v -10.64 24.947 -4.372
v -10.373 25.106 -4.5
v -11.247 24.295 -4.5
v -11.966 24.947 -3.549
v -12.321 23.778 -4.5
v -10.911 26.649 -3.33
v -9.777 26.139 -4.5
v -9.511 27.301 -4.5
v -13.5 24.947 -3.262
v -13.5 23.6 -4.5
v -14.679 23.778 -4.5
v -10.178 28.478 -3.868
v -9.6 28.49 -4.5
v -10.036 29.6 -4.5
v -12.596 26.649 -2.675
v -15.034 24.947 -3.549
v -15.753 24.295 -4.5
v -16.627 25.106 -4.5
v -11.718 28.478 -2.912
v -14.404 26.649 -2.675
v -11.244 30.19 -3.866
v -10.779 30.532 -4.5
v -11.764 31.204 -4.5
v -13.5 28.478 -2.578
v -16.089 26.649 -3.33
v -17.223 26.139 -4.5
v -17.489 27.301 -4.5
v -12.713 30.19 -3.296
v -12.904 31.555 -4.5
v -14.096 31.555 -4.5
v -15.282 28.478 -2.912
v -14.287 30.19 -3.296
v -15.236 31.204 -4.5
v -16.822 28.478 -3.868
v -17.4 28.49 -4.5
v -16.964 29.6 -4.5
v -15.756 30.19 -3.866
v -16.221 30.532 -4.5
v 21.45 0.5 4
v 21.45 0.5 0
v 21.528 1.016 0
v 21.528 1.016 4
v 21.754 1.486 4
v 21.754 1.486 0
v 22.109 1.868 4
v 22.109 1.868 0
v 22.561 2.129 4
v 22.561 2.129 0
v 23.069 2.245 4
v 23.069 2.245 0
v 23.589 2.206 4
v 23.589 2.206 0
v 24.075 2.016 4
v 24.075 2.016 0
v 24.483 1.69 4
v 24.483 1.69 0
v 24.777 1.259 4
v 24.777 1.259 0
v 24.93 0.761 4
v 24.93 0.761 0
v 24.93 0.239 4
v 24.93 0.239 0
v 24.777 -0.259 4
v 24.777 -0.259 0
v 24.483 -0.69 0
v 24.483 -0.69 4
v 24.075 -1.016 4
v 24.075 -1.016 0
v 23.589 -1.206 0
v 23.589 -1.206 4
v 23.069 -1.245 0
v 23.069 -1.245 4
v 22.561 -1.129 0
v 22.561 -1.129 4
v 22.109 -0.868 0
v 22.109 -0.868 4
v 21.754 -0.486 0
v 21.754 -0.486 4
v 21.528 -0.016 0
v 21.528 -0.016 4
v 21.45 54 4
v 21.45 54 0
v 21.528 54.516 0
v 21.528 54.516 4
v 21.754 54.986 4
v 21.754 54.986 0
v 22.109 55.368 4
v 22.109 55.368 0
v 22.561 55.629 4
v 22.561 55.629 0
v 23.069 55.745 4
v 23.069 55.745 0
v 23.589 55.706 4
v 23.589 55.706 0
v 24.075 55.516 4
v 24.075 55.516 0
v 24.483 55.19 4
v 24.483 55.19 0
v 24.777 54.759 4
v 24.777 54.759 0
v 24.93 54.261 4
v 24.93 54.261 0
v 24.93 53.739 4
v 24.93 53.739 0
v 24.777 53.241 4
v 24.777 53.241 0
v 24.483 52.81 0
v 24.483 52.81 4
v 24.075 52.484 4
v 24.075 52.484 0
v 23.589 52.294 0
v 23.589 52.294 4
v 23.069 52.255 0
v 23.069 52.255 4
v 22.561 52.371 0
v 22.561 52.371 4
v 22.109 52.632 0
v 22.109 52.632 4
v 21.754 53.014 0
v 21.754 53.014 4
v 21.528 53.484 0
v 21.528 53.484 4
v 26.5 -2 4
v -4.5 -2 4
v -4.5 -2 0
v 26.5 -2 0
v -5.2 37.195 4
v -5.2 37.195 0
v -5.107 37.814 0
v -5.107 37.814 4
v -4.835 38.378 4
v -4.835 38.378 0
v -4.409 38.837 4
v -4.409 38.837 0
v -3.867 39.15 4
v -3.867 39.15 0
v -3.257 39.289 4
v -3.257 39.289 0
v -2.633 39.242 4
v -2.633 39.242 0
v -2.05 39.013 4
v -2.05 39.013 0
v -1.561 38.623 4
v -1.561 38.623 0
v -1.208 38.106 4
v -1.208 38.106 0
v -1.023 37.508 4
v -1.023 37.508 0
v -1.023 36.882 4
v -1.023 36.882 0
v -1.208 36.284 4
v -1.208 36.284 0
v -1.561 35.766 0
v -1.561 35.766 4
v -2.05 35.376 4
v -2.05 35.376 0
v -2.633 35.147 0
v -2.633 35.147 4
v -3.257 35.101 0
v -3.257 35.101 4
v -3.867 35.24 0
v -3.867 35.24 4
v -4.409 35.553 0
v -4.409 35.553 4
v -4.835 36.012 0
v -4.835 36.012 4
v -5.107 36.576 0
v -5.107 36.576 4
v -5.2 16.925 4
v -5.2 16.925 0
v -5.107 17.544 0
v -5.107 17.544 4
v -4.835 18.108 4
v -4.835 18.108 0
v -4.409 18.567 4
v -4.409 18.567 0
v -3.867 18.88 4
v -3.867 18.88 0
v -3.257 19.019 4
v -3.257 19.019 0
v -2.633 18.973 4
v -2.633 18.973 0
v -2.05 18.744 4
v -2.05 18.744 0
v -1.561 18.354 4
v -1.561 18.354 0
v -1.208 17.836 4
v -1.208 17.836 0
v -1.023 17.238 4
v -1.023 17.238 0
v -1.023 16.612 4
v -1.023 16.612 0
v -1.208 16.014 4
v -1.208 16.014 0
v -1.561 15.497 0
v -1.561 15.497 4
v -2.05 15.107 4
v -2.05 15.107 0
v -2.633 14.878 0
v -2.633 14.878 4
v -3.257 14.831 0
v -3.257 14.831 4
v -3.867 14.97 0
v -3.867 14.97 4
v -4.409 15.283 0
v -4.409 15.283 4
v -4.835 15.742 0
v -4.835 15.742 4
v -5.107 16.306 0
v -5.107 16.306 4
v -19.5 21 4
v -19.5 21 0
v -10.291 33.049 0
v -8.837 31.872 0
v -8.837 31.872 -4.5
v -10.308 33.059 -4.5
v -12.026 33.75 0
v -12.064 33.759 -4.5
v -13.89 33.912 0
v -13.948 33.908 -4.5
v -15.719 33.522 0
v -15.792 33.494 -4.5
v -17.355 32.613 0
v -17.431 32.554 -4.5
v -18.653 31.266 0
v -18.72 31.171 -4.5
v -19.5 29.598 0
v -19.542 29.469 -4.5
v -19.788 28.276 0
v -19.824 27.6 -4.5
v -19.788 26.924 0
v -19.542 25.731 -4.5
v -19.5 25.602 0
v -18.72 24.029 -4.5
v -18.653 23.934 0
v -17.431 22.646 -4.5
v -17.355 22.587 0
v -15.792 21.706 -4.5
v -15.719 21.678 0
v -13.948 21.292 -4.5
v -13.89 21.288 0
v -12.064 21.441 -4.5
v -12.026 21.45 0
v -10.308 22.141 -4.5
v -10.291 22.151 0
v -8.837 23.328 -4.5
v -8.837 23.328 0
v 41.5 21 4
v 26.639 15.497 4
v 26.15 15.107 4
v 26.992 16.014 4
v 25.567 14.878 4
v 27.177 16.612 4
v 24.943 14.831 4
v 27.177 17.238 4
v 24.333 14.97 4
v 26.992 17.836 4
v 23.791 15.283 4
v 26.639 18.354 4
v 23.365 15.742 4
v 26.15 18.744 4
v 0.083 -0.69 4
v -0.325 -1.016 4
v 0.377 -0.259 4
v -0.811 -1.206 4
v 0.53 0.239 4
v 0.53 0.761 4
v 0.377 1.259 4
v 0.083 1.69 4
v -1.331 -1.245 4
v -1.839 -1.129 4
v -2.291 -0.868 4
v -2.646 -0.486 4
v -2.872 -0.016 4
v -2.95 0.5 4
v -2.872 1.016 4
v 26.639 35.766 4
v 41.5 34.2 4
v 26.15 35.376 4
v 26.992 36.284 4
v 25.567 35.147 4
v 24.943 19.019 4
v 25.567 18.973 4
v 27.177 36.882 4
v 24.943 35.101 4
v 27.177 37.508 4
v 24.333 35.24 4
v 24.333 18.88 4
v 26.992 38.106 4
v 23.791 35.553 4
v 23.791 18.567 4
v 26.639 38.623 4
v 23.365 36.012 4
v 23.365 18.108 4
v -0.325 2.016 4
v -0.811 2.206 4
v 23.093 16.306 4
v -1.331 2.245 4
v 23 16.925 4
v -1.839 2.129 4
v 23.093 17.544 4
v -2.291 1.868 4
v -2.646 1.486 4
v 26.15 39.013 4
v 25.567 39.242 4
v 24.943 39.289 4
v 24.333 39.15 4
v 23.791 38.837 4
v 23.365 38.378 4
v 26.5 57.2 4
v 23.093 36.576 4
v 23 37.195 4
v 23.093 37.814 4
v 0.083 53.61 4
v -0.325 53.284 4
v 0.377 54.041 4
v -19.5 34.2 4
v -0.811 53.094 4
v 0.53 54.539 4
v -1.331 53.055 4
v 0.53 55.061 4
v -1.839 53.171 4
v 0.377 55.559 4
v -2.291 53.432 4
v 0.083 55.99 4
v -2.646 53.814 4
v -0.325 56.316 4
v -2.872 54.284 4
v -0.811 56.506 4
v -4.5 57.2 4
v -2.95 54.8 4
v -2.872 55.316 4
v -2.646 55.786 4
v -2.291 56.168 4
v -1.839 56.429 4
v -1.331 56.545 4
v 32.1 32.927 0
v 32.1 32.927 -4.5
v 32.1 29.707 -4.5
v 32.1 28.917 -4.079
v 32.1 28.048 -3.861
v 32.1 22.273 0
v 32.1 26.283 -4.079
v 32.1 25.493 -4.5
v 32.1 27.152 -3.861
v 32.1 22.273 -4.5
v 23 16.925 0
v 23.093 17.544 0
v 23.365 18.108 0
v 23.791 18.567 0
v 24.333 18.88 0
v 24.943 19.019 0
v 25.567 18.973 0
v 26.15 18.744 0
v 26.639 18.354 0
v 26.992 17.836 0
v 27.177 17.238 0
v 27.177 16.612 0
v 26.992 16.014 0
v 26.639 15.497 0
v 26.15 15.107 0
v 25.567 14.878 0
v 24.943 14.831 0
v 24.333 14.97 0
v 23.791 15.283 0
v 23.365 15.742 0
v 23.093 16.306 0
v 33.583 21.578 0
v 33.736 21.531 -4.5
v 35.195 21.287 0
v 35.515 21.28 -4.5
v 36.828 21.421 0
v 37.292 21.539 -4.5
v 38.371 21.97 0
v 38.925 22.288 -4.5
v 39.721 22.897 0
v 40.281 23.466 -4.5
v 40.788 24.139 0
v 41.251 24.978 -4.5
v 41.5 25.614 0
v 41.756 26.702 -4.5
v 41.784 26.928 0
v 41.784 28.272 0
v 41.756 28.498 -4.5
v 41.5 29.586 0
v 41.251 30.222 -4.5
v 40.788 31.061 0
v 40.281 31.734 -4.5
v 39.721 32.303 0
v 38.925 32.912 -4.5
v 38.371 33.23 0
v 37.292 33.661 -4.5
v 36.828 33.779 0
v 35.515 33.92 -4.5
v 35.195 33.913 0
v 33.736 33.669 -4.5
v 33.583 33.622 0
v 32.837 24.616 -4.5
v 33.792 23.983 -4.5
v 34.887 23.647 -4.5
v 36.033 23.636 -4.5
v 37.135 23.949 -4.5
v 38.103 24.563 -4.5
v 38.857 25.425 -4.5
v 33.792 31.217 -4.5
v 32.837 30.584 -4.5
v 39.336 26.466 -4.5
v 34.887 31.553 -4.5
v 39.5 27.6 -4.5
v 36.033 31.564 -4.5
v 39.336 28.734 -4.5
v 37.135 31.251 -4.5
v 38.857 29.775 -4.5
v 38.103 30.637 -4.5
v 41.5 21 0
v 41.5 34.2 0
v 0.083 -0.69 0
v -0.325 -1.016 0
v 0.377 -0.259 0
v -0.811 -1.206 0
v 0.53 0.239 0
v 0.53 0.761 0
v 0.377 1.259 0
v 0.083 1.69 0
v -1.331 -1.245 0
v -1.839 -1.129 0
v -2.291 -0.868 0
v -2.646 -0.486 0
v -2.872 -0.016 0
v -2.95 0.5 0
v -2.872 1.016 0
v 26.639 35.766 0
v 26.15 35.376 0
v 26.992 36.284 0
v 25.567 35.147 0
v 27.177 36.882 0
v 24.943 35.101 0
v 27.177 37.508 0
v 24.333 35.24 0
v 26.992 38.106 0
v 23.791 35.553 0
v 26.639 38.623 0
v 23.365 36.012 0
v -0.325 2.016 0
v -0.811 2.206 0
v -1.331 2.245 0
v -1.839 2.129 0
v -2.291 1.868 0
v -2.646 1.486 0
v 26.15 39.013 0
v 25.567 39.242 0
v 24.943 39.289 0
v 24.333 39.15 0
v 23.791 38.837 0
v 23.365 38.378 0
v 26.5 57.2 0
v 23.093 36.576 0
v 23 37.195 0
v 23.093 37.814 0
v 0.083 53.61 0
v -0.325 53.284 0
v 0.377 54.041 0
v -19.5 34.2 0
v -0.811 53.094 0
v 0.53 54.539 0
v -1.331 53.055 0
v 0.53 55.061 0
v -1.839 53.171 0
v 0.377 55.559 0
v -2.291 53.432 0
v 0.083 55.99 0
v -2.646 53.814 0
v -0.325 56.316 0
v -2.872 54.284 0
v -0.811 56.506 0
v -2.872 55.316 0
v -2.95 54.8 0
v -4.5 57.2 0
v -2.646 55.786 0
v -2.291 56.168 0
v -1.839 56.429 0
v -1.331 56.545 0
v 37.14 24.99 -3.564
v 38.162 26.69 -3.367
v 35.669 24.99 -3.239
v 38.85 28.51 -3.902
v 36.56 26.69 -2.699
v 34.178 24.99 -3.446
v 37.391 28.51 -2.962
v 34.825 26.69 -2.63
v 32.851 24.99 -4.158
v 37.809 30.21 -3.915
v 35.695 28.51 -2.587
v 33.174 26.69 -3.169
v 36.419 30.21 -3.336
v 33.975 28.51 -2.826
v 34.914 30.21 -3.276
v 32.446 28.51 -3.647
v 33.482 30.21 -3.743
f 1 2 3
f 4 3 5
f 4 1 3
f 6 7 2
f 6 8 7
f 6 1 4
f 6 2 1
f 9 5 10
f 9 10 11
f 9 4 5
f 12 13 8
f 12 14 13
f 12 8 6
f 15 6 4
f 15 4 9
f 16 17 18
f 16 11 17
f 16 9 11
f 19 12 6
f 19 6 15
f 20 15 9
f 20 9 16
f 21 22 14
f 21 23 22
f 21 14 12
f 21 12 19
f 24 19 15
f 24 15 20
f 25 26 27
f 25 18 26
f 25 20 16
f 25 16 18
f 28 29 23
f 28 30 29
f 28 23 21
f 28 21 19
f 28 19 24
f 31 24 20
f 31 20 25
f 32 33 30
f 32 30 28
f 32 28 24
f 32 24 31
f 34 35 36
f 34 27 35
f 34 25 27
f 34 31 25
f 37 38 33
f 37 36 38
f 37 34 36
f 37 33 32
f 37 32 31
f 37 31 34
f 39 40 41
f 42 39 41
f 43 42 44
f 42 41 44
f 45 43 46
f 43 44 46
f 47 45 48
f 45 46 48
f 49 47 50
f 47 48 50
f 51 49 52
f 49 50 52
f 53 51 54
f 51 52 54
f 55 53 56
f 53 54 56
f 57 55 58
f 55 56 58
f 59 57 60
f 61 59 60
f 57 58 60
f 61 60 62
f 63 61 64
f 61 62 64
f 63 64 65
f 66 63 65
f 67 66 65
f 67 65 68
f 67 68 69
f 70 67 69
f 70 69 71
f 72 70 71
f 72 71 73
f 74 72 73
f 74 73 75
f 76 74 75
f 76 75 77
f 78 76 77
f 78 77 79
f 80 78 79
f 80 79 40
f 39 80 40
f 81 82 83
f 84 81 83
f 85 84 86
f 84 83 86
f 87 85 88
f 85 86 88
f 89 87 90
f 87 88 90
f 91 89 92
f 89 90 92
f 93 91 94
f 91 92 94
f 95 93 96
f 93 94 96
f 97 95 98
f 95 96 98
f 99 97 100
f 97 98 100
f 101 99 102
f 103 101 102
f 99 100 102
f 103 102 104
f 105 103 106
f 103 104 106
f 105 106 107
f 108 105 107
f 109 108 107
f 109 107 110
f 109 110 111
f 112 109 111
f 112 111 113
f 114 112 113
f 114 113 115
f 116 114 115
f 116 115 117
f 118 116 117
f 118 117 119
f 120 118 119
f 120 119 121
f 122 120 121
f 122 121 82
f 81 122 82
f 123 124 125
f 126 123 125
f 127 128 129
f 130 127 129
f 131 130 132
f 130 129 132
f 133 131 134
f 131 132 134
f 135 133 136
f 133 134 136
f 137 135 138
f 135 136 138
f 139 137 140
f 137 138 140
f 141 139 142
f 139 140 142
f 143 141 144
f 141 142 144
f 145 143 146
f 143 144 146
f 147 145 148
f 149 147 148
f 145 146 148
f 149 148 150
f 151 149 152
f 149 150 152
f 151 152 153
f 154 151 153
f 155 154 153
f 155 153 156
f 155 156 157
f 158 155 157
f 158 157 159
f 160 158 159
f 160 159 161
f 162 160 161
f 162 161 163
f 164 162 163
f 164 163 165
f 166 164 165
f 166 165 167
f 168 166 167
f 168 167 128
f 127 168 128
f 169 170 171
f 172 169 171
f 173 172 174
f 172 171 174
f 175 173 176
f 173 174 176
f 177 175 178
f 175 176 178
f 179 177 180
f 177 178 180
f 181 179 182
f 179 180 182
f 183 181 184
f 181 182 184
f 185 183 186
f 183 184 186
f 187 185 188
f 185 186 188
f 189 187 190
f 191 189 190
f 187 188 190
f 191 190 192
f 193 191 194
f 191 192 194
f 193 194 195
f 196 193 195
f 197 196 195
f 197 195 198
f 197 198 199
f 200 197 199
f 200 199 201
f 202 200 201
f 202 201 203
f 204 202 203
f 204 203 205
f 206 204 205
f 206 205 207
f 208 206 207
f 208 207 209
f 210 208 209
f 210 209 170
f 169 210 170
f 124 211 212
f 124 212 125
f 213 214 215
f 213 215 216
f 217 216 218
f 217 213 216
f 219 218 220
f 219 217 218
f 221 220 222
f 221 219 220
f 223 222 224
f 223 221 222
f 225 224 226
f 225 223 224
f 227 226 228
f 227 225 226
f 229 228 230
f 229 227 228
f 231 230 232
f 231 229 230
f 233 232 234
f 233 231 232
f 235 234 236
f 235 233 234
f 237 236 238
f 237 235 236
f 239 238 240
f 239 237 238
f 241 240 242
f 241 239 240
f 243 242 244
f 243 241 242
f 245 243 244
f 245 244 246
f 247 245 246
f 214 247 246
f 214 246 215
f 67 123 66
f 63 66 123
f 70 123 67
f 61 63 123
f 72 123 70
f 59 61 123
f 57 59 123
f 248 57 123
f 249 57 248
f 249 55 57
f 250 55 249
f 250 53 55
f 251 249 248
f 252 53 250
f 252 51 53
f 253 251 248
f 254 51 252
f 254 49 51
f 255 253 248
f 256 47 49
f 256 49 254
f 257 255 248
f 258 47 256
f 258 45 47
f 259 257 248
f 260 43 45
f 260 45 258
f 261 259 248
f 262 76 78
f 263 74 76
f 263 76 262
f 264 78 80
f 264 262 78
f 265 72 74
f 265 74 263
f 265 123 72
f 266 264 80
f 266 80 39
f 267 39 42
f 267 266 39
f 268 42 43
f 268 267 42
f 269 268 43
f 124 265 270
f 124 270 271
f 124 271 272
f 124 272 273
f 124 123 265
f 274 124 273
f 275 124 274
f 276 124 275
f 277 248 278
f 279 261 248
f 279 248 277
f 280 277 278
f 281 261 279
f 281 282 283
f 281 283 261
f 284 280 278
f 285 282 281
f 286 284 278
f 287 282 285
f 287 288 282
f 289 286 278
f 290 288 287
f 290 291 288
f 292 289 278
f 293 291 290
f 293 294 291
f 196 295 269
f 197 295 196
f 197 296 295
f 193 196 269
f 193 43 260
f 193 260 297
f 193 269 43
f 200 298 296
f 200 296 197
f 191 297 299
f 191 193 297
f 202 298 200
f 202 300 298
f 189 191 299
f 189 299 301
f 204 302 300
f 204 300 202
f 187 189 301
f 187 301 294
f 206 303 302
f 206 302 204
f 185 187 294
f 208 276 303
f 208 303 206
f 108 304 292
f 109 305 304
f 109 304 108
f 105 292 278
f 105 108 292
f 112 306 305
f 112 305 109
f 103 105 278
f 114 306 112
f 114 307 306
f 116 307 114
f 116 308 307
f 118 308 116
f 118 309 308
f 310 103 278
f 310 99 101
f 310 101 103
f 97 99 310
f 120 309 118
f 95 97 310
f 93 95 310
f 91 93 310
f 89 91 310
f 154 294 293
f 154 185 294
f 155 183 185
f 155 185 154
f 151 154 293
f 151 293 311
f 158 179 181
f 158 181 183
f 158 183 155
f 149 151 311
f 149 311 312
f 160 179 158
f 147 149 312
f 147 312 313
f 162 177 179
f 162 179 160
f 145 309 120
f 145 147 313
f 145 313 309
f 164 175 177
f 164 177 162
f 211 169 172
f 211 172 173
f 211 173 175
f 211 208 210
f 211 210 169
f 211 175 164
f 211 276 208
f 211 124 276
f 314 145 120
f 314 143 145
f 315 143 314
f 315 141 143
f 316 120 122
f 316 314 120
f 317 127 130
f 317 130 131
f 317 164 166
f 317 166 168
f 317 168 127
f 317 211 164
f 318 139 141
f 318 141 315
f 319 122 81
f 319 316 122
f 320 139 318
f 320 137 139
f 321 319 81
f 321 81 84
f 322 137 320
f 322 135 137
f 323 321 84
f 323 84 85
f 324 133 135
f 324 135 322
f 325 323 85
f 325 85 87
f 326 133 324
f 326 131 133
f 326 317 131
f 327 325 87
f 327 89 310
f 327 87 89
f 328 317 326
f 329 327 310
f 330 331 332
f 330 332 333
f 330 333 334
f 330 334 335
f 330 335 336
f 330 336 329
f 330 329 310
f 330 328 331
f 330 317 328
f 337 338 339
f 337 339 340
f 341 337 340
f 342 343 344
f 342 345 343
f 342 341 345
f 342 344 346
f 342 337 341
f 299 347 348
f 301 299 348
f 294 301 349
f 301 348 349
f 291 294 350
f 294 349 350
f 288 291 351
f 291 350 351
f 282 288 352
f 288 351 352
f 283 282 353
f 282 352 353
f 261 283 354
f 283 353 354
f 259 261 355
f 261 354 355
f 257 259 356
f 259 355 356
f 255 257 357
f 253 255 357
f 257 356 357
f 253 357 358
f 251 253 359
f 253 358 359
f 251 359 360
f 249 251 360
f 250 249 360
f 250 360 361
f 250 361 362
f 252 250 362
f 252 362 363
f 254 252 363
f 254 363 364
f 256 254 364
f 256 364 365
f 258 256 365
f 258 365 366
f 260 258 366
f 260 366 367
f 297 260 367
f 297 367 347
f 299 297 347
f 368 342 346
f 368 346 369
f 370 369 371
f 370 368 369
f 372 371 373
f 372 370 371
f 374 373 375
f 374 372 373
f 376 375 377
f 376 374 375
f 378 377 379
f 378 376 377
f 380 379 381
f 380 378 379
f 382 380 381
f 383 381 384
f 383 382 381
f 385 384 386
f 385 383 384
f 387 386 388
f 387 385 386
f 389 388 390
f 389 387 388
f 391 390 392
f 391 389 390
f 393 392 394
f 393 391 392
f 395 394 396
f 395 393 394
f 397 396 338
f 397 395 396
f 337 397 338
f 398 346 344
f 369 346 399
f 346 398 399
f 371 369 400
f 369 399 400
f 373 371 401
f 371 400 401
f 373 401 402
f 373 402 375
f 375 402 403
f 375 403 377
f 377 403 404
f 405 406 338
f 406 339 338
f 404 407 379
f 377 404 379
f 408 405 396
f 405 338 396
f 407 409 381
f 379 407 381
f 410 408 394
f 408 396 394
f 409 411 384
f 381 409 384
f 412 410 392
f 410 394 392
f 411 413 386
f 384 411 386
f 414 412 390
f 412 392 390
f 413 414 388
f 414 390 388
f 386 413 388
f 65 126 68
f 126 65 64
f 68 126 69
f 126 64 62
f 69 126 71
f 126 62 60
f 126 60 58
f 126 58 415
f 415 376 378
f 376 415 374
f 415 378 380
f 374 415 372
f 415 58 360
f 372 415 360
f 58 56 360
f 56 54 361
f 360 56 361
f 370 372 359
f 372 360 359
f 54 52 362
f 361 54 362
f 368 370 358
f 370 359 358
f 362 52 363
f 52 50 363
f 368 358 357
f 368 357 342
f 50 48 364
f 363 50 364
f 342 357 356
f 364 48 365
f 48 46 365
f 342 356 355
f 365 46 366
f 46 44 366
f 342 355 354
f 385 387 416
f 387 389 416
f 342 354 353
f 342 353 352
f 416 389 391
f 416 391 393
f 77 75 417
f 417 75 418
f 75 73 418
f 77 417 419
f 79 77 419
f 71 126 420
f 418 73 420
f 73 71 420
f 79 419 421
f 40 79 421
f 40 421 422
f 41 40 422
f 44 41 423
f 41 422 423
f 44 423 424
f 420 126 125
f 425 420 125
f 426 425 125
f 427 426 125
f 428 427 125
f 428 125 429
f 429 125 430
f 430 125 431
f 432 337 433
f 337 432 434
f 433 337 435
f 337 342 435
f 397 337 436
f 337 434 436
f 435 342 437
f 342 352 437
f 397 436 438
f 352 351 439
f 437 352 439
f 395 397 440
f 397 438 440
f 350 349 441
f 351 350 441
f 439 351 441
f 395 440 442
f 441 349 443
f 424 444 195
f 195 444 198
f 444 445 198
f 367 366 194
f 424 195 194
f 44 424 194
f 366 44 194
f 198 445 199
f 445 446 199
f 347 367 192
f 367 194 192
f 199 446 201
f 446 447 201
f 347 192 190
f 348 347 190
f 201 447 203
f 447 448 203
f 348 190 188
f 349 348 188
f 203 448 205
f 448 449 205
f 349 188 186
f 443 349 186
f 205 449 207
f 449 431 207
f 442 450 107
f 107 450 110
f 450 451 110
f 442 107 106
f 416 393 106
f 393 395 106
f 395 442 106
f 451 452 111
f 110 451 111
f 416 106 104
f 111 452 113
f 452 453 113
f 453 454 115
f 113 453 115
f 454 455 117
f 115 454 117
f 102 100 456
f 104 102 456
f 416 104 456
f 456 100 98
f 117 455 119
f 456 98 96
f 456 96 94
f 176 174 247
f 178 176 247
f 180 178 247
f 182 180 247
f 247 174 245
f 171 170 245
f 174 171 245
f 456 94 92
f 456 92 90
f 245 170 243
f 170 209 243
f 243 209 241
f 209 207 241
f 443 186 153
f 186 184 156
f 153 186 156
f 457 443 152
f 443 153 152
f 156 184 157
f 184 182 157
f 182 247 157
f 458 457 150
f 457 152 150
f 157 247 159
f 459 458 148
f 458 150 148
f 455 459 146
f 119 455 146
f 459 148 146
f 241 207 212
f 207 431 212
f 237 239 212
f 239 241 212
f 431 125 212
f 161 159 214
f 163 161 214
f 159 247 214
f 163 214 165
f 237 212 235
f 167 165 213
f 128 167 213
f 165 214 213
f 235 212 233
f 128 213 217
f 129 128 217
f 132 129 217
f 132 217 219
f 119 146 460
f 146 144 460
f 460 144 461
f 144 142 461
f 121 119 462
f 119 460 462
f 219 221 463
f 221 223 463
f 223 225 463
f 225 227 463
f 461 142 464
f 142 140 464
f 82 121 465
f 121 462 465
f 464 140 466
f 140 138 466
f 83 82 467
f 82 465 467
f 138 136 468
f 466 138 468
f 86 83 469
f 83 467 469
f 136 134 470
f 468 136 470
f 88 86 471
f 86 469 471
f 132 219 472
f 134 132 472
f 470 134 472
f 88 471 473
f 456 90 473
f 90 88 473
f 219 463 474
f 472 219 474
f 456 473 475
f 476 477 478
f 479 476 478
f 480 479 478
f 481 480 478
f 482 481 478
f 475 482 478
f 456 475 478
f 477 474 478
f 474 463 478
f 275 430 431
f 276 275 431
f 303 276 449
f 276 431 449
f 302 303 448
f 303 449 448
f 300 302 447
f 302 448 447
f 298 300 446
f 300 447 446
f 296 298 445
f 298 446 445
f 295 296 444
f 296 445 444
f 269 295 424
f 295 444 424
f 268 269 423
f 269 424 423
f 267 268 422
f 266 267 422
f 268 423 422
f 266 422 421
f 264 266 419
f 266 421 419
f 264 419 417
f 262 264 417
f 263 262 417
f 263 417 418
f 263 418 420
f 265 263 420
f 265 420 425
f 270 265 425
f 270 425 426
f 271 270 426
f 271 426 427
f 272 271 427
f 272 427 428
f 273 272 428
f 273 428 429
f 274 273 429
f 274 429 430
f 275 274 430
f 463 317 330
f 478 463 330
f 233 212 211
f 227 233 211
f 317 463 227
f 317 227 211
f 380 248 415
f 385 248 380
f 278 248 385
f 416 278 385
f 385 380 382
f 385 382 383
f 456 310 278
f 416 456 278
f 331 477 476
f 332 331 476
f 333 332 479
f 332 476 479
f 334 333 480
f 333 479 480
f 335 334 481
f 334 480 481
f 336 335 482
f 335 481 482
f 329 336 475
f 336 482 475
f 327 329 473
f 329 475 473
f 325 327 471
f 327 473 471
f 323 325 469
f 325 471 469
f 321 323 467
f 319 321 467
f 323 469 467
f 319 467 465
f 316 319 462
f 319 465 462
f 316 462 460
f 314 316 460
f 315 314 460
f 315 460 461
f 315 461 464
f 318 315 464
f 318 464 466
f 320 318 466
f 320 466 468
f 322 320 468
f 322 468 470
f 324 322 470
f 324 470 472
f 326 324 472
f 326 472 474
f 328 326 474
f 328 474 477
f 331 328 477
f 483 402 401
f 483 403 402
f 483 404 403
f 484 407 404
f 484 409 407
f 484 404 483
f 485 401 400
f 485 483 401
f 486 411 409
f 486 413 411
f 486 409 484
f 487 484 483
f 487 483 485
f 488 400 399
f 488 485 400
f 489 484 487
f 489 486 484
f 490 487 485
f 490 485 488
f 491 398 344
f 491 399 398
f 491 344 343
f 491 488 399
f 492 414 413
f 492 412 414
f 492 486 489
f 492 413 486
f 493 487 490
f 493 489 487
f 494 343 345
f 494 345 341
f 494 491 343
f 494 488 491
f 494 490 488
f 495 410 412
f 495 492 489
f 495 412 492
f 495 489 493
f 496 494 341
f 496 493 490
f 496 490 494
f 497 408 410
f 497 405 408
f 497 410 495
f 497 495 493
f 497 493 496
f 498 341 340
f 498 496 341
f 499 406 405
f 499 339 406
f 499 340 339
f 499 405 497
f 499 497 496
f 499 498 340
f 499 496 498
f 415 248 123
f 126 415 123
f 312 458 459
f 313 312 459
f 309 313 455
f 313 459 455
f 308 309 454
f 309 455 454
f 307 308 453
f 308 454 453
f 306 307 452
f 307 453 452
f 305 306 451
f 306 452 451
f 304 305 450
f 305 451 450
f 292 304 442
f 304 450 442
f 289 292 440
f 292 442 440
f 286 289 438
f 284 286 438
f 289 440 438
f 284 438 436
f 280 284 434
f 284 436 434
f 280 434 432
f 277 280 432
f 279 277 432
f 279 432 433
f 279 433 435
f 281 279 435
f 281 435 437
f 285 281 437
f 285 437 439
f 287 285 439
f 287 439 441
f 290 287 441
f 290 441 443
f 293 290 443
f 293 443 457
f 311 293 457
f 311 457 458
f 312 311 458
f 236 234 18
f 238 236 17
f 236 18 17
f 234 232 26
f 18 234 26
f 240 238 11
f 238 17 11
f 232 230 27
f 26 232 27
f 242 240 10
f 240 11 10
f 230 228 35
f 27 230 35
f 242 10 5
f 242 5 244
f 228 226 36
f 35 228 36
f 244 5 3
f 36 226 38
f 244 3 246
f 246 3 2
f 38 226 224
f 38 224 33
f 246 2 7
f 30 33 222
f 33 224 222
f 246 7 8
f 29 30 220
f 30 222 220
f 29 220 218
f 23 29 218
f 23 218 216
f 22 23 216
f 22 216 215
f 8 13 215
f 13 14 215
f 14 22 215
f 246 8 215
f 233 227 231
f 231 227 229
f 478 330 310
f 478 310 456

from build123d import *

# Parameters (mm, degrees)
CROQUIS1_W               = 22
CROQUIS1_H               = 55.2
SALIENTE_EXTRUIR1_DEPTH  = 4
CROQUIS2_W               = 12.1
CROQUIS2_H               = 4
CORTAR_EXTRUIR1_DEPTH    = 9.6
CROQUIS3_W               = 12.1
CROQUIS3_H               = 4
CORTAR_EXTRUIR2_DEPTH    = 9.6
CORTAR_EXTRUIR3_DEPTH    = 16
CORTAR_EXTRUIR4_START    = -16
CORTAR_EXTRUIR4_DEPTH    = 16
CROQUIS9_W               = 11.778481694
CROQUIS9_H               = 4
CORTAR_EXTRUIR5_DEPTH    = 2
CROQUIS11_W              = 4.95
CROQUIS11_H              = 4
SALIENTE_EXTRUIR3_DEPTH  = 2
CROQUIS12_W              = 4
CROQUIS12_H              = 1.8
SALIENTE_EXTRUIR4_DEPTH  = 12.1
CROQUIS13_W              = 4.95
CROQUIS13_H              = 4
SALIENTE_EXTRUIR5_DEPTH  = 2
CROQUIS14_W              = 4
CROQUIS14_H              = 1.8
SALIENTE_EXTRUIR6_DEPTH  = 12.1
CROQUIS17_W              = 4
CROQUIS17_H              = 59.2
SALIENTE_EXTRUIR8_DEPTH  = 11.5
CROQUIS18_W              = 4
CROQUIS18_H              = 59.2
SALIENTE_EXTRUIR9_DEPTH  = 11.5
CROQUIS19_R              = 1.75
CORTAR_EXTRUIR6_DEPTH    = 11.5
CROQUIS27_W              = 12.1
CROQUIS27_H              = 55.6
CORTAR_EXTRUIR8_DEPTH    = 10
CROQUIS28_W              = 12.1
CROQUIS28_H              = 4
SALIENTE_EXTRUIR10_DEPTH = 55.6
CROQUIS33_W              = 4
CROQUIS33_H              = 59.2
SALIENTE_EXTRUIR13_DEPTH = 8
CROQUIS30_R              = 2.1
CORTAR_EXTRUIR9_DEPTH    = 10
CROQUIS32_W              = 4
CROQUIS32_H              = 59.2
SALIENTE_EXTRUIR12_DEPTH = 8
SALIENTE_EXTRUIR11_DEPTH = 4.5
CORTAR_EXTRUIR10_DEPTH   = 8


with BuildPart() as part:
    # Croquis1 → Saliente-Extruir1 (new body)
    with BuildSketch(Plane.XY):
        with Locations((11, 27.6)):
            Rectangle(CROQUIS1_W, CROQUIS1_H)
    extrude(amount=SALIENTE_EXTRUIR1_DEPTH)

    # Croquis2 → Cortar-Extruir1 (cut)
    with BuildSketch(Plane(origin=(0, 55.2, 0), x_dir=(1, 0, 0), z_dir=(0, 1, 0))):
        with Locations((11, -2)):
            Rectangle(CROQUIS2_W, CROQUIS2_H)
    extrude(amount=-CORTAR_EXTRUIR1_DEPTH, mode=Mode.SUBTRACT)

    # Croquis3 → Cortar-Extruir2 (cut)
    with BuildSketch(Plane.XZ):
        with Locations((11, 2)):
            Rectangle(CROQUIS3_W, CROQUIS3_H)
    extrude(amount=-CORTAR_EXTRUIR2_DEPTH, mode=Mode.SUBTRACT)

    # Croquis5 → Cortar-Extruir3 (cut)
    with BuildSketch(Plane.XZ.offset(-9.6)):
        with BuildLine():
            Line((7.4, 4), (14.6, 4))
            ThreePointArc((14.6, 4), (16.401151853, 1.506649462), (17.05, -1.5))
            Line((17.05, -1.5), (4.95, -1.5))
            ThreePointArc((4.95, -1.5), (5.598848147, 1.506649462), (7.4, 4))
        make_face()
    extrude(amount=-CORTAR_EXTRUIR3_DEPTH, mode=Mode.SUBTRACT)

    # Croquis7 → Cortar-Extruir4 (cut)
    with BuildSketch(Plane(origin=(0, 45.6, 0), x_dir=(1, 0, 0), z_dir=(0, 1, 0)).offset(CORTAR_EXTRUIR4_START)):
        with BuildLine():
            Line((4.95, 1.5), (17.05, 1.5))
            ThreePointArc((17.05, 1.5), (16.401151853, -1.506649462), (14.6, -4))
            Line((14.6, -4), (7.4, -4))
            ThreePointArc((7.4, -4), (5.598848147, -1.506649462), (4.95, 1.5))
        make_face()
    extrude(amount=CORTAR_EXTRUIR4_DEPTH, mode=Mode.SUBTRACT)

    # Croquis9 → Cortar-Extruir5 (cut)
    with BuildSketch(Plane(origin=(0, 0, 0), x_dir=(-1, 0, 0), z_dir=(0, 0, -1))):
        with Locations((-11, 27.6)):
            Rectangle(CROQUIS9_W, CROQUIS9_H)
    extrude(amount=-CORTAR_EXTRUIR5_DEPTH, mode=Mode.SUBTRACT)

    # Croquis11 → Saliente-Extruir3 (add)
    with BuildSketch(Plane(origin=(0, 55.2, 0), x_dir=(1, 0, 0), z_dir=(0, 1, 0))):
        with Locations((2.475, -2)):
            Rectangle(CROQUIS11_W, CROQUIS11_H)
        with Locations((19.525, -2)):
            Rectangle(CROQUIS11_W, CROQUIS11_H)
    extrude(amount=SALIENTE_EXTRUIR3_DEPTH)

    # Croquis12 → Saliente-Extruir4 (add)
    with BuildSketch(Plane(origin=(4.95, 0, 0), x_dir=(0, 0, -1), z_dir=(1, 0, 0))):
        with Locations((-2, 56.3)):
            Rectangle(CROQUIS12_W, CROQUIS12_H)
    extrude(amount=SALIENTE_EXTRUIR4_DEPTH)

    # Croquis13 → Saliente-Extruir5 (add)
    with BuildSketch(Plane.XZ):
        with Locations((19.525, 2)):
            Rectangle(CROQUIS13_W, CROQUIS13_H)
        with Locations((2.475, 2)):
            Rectangle(CROQUIS13_W, CROQUIS13_H)
    extrude(amount=SALIENTE_EXTRUIR5_DEPTH)

    # Croquis14 → Saliente-Extruir6 (add)
    with BuildSketch(Plane(origin=(4.95, 0, 0), x_dir=(0, 0, -1), z_dir=(1, 0, 0))):
        with Locations((-2, -1.1)):
            Rectangle(CROQUIS14_W, CROQUIS14_H)
    extrude(amount=SALIENTE_EXTRUIR6_DEPTH)

    # Croquis17 → Saliente-Extruir8 (add)
    with BuildSketch(Plane.ZY):
        with Locations((2, 27.6)):
            Rectangle(CROQUIS17_W, CROQUIS17_H)
    extrude(amount=SALIENTE_EXTRUIR8_DEPTH)

    # Croquis18 → Saliente-Extruir9 (add)
    with BuildSketch(Plane(origin=(22, 0, 0), x_dir=(0, 0, -1), z_dir=(1, 0, 0))):
        with Locations((-2, 27.6)):
            Rectangle(CROQUIS18_W, CROQUIS18_H)
    extrude(amount=SALIENTE_EXTRUIR9_DEPTH)

    # Croquis19 → Cortar-Extruir6 (cut)
    with BuildSketch(Plane(origin=(0, 0, 0), x_dir=(-1, 0, 0), z_dir=(0, 0, -1))):
        with Locations((-23.2, 54)):
            Circle(CROQUIS19_R)
        with Locations((1.2, 54.8)):
            Circle(CROQUIS19_R)
        with Locations((1.2, 0.5)):
            Circle(CROQUIS19_R)
        with Locations((-23.2, 0.5)):
            Circle(CROQUIS19_R)
    extrude(amount=-CORTAR_EXTRUIR6_DEPTH, mode=Mode.SUBTRACT)

    # Croquis27 → Cortar-Extruir8 (cut)
    with BuildSketch(Plane(origin=(0, 0, 0), x_dir=(-1, 0, 0), z_dir=(0, 0, -1))):
        with Locations((-11, 27.6)):
            Rectangle(CROQUIS27_W, CROQUIS27_H)
    extrude(amount=-CORTAR_EXTRUIR8_DEPTH, mode=Mode.SUBTRACT)

    # Croquis28 → Saliente-Extruir10 (add)
    with BuildSketch(Plane.XZ.offset(-55.4)):
        with Locations((11, 2)):
            Rectangle(CROQUIS28_W, CROQUIS28_H)
    extrude(amount=SALIENTE_EXTRUIR10_DEPTH)

    # Croquis33 → Saliente-Extruir13 (add)
    with BuildSketch(Plane.ZY.offset(11.5)):
        with Locations((2, 27.6)):
            Rectangle(CROQUIS33_W, CROQUIS33_H)
    extrude(amount=SALIENTE_EXTRUIR13_DEPTH)

    # Croquis30 → Cortar-Extruir9 (cut)
    with BuildSketch(Plane(origin=(0, 0, 0), x_dir=(-1, 0, 0), z_dir=(0, 0, -1))):
        with Locations((-25.1, 37.194789274)):
            Circle(CROQUIS30_R)
        with Locations((-25.1, 16.925277734)):
            Circle(CROQUIS30_R)
        with Locations((3.1, 37.194789274)):
            Circle(CROQUIS30_R)
        with Locations((3.1, 16.925277734)):
            Circle(CROQUIS30_R)
    extrude(amount=-CORTAR_EXTRUIR9_DEPTH, mode=Mode.SUBTRACT)

    # Croquis32 → Saliente-Extruir12 (add)
    with BuildSketch(Plane(origin=(33.5, 0, 0), x_dir=(0, 0, -1), z_dir=(1, 0, 0))):
        with Locations((-2, 27.6)):
            Rectangle(CROQUIS32_W, CROQUIS32_H)
    extrude(amount=SALIENTE_EXTRUIR12_DEPTH)

    # Croquis29 → Saliente-Extruir11 (add)
    with BuildSketch(Plane(origin=(0, 0, 0), x_dir=(-1, 0, 0), z_dir=(0, 0, -1))):
        with BuildLine():
            Line((-32.099895832, 32.201901781), (-32.099895832, 22.998098219))
            Line((-32.099895832, 22.998098219), (-32.099895832, 22.27255299))
            ThreePointArc((-32.099895832, 22.27255299), (-41.82, 27.6), (-32.099895832, 32.92744701))
            Line((-32.099895832, 32.92744701), (-32.099895832, 32.201901781))
        make_face()
        with BuildLine():
            Line((8.83711623, 23.32791238), (8.83711623, 31.87208762))
            ThreePointArc((8.83711623, 31.87208762), (19.824019109, 27.6), (8.83711623, 23.32791238))
        make_face()
    extrude(amount=SALIENTE_EXTRUIR11_DEPTH)

    # Croquis35 → Cortar-Revolución1 (revolve, cut)
    with BuildSketch(Plane(origin=(0, 0, -7.5), x_dir=(-1, 0, 0), z_dir=(0, 0, -1))):
        with BuildLine():
            Line((-35.5, 32.6), (-35.5, 22.6))
            ThreePointArc((-35.5, 22.6), (-40.5, 27.6), (-35.5, 32.6))
        make_face()
    revolve(axis=Axis((35.5, 32.6, -7.5), (0, -1, 0)), mode=Mode.SUBTRACT)

    # Croquis36 → Cortar-Revolución2 (revolve, cut)
    with BuildSketch(Plane(origin=(0, 0, -7.5), x_dir=(-1, 0, 0), z_dir=(0, 0, -1))):
        with BuildLine():
            Line((13.5, 32.6), (13.5, 22.6))
            ThreePointArc((13.5, 22.6), (18.5, 27.6), (13.5, 32.6))
        make_face()
    revolve(axis=Axis((-13.5, 32.6, -7.5), (0, -1, 0)), mode=Mode.SUBTRACT)

    # Croquis37 → Cortar-Extruir10 (cut)
    with BuildSketch(Plane.XY.offset(4)):
        Polygon((-19.5, 57.2), (-19.5, 34.2), (-4.5, 57.2), align=None)
        Polygon((41.5, 57.2), (26.5, 57.2), (41.5, 34.2), align=None)
        Polygon((-19.5, -2), (-19.5, 21), (-4.5, -2), align=None)
        Polygon((41.5, -2), (41.5, 21), (26.5, -2), align=None)
    extrude(amount=-CORTAR_EXTRUIR10_DEPTH, mode=Mode.SUBTRACT)


solid = part.part
